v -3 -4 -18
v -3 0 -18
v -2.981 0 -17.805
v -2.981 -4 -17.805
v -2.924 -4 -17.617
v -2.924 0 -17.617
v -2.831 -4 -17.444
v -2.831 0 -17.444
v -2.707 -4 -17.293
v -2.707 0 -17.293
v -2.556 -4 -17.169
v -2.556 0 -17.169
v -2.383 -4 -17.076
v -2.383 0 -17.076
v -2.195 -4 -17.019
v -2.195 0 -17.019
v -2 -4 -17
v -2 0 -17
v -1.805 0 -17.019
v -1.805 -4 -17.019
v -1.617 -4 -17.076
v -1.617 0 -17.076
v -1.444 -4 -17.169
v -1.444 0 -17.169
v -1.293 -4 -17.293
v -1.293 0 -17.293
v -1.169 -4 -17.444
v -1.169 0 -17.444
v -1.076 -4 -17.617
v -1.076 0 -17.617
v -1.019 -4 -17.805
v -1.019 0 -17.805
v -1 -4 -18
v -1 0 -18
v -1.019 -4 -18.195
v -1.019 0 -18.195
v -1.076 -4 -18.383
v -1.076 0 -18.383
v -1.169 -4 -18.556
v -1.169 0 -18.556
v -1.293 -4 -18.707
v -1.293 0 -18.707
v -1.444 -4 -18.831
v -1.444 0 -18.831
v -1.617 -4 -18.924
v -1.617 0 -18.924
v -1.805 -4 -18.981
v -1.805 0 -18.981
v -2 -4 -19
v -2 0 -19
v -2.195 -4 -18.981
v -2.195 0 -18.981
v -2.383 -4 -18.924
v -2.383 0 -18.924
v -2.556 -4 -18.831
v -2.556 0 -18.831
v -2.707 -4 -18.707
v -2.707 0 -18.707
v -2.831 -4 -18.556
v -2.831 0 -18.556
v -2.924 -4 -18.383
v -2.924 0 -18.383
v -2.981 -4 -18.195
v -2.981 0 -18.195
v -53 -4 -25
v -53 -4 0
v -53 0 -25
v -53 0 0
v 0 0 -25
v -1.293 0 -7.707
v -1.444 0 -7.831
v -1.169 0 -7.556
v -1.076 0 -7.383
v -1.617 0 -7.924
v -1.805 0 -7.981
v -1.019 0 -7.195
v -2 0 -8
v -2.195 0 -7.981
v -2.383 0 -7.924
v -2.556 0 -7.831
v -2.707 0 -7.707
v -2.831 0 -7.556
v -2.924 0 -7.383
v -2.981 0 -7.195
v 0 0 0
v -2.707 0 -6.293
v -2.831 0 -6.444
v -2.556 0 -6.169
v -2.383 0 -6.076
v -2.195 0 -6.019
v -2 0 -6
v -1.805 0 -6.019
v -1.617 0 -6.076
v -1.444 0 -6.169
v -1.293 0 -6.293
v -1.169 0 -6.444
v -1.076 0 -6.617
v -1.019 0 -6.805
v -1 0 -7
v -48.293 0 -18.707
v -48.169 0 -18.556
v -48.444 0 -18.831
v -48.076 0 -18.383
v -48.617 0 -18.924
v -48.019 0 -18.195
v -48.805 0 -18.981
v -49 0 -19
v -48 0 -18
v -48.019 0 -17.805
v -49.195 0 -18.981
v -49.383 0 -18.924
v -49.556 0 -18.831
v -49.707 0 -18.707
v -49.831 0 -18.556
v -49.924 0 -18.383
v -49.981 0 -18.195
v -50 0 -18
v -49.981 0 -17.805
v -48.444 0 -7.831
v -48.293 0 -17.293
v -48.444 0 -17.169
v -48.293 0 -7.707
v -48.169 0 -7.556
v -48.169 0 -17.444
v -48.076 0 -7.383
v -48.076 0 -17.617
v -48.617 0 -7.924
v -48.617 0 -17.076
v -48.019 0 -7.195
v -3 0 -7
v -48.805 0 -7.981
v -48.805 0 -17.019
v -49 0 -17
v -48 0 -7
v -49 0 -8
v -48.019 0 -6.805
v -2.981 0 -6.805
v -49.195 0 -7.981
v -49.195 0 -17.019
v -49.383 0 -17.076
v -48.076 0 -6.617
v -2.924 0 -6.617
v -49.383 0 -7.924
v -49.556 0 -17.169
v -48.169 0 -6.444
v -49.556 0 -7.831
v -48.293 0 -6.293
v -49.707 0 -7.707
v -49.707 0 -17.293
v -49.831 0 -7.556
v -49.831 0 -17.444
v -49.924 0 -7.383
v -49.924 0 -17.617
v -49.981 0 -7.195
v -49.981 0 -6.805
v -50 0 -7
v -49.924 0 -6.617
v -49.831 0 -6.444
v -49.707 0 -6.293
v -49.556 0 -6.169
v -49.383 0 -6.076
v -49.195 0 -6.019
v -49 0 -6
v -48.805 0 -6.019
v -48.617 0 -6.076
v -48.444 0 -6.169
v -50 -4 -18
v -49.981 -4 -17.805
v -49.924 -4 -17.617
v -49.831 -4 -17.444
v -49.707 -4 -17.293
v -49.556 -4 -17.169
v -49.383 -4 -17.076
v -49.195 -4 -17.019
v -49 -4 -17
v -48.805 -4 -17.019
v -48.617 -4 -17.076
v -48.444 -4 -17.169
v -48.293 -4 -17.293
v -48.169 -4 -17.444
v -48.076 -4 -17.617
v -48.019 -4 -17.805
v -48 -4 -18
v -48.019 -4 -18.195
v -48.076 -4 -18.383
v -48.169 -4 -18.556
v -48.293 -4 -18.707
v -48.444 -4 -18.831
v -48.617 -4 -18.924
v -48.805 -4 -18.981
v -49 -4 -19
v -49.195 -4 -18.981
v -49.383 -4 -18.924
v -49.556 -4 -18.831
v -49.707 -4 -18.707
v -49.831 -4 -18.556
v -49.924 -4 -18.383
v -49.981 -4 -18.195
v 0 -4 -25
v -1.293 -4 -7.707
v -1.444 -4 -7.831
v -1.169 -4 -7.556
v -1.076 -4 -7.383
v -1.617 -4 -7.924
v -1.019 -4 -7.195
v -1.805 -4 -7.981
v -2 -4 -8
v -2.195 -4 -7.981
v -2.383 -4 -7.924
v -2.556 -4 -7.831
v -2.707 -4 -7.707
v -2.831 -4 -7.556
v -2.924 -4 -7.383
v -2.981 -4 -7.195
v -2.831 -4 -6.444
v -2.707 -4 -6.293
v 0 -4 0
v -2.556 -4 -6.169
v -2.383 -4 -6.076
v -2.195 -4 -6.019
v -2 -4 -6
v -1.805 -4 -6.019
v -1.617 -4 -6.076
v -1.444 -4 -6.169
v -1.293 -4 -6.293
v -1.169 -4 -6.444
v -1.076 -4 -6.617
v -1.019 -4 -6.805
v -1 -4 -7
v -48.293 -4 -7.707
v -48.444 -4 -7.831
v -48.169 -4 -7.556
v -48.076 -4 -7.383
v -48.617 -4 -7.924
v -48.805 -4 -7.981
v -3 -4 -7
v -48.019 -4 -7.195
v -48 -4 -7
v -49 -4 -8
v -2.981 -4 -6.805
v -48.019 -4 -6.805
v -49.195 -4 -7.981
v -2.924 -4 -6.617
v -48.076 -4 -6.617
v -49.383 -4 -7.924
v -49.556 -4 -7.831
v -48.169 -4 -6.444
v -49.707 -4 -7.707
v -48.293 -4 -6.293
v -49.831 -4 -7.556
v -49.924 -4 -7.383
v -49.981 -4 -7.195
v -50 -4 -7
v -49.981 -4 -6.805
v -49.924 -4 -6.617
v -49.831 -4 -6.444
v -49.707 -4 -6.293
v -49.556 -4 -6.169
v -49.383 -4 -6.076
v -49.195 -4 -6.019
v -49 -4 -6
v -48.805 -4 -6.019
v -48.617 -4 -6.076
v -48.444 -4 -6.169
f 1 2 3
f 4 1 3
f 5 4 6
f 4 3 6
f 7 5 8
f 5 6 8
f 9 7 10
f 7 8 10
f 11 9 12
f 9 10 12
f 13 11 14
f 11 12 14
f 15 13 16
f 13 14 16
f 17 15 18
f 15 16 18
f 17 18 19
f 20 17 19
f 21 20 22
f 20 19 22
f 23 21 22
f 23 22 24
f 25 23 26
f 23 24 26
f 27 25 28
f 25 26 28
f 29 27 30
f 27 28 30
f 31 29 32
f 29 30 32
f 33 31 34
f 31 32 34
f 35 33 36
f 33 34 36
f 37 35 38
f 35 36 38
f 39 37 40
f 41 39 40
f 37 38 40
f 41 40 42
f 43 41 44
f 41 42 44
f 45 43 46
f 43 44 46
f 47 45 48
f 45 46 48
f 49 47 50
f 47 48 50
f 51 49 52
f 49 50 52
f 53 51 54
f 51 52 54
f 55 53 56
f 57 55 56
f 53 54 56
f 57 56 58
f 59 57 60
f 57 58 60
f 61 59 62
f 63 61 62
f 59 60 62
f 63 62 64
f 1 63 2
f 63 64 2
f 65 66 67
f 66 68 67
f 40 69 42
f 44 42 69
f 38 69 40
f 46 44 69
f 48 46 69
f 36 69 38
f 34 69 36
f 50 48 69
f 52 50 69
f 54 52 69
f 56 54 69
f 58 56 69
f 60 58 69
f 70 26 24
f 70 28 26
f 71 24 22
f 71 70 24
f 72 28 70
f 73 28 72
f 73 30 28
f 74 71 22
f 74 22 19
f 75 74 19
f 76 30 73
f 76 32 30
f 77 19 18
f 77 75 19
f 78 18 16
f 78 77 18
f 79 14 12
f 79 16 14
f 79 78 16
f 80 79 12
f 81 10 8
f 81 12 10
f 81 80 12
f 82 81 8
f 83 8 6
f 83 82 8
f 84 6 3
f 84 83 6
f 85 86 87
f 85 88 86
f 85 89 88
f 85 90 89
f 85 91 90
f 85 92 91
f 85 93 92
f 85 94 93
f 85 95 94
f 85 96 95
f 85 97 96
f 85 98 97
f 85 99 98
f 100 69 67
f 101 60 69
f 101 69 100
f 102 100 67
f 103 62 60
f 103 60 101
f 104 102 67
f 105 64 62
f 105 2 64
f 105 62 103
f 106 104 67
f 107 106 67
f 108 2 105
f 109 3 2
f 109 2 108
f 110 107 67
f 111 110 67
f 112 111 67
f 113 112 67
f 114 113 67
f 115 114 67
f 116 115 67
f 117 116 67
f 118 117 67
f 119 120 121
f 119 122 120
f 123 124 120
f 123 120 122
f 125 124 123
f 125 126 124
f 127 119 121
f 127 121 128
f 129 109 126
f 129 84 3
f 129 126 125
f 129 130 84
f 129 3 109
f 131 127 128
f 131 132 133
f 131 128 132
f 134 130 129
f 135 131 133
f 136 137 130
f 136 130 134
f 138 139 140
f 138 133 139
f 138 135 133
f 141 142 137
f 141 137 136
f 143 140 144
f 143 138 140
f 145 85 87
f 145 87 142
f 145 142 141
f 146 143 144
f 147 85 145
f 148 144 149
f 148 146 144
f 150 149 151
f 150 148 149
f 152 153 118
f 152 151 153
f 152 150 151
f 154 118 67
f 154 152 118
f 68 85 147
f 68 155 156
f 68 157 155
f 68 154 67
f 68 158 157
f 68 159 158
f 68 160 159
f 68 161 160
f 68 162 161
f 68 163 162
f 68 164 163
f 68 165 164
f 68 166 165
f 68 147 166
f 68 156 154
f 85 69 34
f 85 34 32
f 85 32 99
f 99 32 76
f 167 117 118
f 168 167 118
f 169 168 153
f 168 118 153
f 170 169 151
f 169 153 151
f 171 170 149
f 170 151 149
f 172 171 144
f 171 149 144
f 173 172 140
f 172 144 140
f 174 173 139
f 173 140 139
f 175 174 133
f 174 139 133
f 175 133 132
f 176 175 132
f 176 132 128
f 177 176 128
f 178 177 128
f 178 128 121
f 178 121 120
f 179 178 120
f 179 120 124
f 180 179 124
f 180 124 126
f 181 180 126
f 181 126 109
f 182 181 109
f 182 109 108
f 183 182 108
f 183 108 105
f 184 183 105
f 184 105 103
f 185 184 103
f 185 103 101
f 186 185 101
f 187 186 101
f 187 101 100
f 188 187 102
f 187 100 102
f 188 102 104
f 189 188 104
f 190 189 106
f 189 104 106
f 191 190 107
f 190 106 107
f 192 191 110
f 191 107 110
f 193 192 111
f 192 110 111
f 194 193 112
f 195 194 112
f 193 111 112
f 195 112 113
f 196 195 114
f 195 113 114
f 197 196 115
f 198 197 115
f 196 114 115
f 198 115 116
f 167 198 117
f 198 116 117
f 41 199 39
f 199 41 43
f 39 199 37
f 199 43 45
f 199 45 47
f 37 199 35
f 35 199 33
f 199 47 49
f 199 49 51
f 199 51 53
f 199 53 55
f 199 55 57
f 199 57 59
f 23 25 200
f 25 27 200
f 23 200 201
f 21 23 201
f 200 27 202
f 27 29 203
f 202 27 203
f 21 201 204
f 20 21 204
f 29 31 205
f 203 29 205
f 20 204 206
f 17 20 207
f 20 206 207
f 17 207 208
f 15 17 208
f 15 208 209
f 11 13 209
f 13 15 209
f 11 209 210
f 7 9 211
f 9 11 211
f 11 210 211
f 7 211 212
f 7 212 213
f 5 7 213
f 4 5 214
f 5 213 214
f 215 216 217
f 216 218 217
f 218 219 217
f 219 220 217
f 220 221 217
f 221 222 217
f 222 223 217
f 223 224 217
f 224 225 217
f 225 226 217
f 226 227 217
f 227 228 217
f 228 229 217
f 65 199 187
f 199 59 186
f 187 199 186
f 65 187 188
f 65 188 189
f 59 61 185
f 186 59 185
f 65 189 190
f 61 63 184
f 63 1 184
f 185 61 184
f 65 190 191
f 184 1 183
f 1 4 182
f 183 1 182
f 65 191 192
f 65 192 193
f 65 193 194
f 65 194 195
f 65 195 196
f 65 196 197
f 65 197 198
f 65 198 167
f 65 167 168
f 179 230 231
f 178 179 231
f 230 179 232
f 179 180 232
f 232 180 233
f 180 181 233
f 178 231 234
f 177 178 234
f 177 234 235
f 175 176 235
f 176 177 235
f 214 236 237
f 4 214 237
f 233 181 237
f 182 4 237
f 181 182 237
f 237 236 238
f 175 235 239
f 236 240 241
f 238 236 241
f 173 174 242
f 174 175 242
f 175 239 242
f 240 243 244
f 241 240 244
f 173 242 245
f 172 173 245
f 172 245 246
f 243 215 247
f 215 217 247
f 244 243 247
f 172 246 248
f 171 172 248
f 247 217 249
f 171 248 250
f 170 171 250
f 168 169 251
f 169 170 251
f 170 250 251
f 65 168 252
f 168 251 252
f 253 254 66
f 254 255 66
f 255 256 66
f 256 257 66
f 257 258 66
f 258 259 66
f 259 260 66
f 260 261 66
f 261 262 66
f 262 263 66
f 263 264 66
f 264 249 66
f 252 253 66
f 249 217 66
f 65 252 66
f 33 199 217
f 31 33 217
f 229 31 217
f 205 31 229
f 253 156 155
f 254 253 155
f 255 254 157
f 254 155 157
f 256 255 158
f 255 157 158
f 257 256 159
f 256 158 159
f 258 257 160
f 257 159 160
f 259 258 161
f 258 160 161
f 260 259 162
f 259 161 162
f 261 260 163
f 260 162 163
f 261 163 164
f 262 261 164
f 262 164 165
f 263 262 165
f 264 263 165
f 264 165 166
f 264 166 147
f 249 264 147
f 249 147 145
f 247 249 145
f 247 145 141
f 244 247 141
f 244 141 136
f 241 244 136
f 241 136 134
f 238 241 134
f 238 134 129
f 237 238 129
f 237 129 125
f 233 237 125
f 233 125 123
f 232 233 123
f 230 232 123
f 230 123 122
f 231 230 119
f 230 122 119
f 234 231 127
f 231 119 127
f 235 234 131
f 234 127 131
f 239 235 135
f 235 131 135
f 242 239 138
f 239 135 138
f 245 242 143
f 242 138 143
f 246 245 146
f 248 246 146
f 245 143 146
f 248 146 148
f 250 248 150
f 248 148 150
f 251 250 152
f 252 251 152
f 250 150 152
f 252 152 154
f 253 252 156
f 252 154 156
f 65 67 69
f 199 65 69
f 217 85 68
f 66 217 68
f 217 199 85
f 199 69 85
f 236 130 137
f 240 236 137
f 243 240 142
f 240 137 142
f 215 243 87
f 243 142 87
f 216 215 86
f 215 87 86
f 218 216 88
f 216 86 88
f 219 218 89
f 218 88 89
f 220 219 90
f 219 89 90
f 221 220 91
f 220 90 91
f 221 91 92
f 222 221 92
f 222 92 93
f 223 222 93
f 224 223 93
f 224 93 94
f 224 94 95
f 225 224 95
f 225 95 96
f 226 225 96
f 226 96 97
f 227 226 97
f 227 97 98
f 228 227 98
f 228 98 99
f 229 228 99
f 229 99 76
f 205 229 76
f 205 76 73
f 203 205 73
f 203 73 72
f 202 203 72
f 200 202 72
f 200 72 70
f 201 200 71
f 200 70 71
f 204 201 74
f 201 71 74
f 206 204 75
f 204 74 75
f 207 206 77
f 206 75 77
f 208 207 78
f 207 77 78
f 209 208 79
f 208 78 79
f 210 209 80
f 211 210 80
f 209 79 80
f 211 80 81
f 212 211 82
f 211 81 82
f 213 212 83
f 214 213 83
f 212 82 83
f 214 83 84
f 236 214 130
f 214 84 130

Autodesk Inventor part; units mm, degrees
ref_plane "YZ Plane" through (0, 0, 0) normal (1, 0, 0) x (0, 1, 0)
ref_plane "XZ Plane" through (0, 0, 0) normal (0, 1, 0) x (-1, 0, 0)
ref_plane "XY Plane" through (0, 0, 0) normal (0, 0, 1) x (1, 0, 0)
sketch "Sketch1" plane through (0, 0, 0) normal (0, 1, 0) x (-1, 0, 0)
  line L0 (0, 0) -> (53, 0)
  line L1 (53, 0) -> (53, -25)
  line L2 (53, -25) -> (0, -25)
  line L3 (0, -25) -> (0, 0)
  circle A0 centre (49, -18) radius 1
  circle A1 centre (49, -7) radius 1
  line L4 (53, -12.5) -> (0, -12.5)
  line L5 (26.5, 0) -> (26.5, -25)
  circle A2 centre (2, -18) radius 1
  circle A3 centre (2, -7) radius 1
  dimension "d228" = 25
  dimension "d229" = 53
  dimension "d232" = 11
  dimension "d233" = 4
  dimension "d234" = 2
  dimension "d240" = 2
extrude "Extrusion1" add sketch "Sketch1" against normal blind 4
properties part number "Langbektang houder"
